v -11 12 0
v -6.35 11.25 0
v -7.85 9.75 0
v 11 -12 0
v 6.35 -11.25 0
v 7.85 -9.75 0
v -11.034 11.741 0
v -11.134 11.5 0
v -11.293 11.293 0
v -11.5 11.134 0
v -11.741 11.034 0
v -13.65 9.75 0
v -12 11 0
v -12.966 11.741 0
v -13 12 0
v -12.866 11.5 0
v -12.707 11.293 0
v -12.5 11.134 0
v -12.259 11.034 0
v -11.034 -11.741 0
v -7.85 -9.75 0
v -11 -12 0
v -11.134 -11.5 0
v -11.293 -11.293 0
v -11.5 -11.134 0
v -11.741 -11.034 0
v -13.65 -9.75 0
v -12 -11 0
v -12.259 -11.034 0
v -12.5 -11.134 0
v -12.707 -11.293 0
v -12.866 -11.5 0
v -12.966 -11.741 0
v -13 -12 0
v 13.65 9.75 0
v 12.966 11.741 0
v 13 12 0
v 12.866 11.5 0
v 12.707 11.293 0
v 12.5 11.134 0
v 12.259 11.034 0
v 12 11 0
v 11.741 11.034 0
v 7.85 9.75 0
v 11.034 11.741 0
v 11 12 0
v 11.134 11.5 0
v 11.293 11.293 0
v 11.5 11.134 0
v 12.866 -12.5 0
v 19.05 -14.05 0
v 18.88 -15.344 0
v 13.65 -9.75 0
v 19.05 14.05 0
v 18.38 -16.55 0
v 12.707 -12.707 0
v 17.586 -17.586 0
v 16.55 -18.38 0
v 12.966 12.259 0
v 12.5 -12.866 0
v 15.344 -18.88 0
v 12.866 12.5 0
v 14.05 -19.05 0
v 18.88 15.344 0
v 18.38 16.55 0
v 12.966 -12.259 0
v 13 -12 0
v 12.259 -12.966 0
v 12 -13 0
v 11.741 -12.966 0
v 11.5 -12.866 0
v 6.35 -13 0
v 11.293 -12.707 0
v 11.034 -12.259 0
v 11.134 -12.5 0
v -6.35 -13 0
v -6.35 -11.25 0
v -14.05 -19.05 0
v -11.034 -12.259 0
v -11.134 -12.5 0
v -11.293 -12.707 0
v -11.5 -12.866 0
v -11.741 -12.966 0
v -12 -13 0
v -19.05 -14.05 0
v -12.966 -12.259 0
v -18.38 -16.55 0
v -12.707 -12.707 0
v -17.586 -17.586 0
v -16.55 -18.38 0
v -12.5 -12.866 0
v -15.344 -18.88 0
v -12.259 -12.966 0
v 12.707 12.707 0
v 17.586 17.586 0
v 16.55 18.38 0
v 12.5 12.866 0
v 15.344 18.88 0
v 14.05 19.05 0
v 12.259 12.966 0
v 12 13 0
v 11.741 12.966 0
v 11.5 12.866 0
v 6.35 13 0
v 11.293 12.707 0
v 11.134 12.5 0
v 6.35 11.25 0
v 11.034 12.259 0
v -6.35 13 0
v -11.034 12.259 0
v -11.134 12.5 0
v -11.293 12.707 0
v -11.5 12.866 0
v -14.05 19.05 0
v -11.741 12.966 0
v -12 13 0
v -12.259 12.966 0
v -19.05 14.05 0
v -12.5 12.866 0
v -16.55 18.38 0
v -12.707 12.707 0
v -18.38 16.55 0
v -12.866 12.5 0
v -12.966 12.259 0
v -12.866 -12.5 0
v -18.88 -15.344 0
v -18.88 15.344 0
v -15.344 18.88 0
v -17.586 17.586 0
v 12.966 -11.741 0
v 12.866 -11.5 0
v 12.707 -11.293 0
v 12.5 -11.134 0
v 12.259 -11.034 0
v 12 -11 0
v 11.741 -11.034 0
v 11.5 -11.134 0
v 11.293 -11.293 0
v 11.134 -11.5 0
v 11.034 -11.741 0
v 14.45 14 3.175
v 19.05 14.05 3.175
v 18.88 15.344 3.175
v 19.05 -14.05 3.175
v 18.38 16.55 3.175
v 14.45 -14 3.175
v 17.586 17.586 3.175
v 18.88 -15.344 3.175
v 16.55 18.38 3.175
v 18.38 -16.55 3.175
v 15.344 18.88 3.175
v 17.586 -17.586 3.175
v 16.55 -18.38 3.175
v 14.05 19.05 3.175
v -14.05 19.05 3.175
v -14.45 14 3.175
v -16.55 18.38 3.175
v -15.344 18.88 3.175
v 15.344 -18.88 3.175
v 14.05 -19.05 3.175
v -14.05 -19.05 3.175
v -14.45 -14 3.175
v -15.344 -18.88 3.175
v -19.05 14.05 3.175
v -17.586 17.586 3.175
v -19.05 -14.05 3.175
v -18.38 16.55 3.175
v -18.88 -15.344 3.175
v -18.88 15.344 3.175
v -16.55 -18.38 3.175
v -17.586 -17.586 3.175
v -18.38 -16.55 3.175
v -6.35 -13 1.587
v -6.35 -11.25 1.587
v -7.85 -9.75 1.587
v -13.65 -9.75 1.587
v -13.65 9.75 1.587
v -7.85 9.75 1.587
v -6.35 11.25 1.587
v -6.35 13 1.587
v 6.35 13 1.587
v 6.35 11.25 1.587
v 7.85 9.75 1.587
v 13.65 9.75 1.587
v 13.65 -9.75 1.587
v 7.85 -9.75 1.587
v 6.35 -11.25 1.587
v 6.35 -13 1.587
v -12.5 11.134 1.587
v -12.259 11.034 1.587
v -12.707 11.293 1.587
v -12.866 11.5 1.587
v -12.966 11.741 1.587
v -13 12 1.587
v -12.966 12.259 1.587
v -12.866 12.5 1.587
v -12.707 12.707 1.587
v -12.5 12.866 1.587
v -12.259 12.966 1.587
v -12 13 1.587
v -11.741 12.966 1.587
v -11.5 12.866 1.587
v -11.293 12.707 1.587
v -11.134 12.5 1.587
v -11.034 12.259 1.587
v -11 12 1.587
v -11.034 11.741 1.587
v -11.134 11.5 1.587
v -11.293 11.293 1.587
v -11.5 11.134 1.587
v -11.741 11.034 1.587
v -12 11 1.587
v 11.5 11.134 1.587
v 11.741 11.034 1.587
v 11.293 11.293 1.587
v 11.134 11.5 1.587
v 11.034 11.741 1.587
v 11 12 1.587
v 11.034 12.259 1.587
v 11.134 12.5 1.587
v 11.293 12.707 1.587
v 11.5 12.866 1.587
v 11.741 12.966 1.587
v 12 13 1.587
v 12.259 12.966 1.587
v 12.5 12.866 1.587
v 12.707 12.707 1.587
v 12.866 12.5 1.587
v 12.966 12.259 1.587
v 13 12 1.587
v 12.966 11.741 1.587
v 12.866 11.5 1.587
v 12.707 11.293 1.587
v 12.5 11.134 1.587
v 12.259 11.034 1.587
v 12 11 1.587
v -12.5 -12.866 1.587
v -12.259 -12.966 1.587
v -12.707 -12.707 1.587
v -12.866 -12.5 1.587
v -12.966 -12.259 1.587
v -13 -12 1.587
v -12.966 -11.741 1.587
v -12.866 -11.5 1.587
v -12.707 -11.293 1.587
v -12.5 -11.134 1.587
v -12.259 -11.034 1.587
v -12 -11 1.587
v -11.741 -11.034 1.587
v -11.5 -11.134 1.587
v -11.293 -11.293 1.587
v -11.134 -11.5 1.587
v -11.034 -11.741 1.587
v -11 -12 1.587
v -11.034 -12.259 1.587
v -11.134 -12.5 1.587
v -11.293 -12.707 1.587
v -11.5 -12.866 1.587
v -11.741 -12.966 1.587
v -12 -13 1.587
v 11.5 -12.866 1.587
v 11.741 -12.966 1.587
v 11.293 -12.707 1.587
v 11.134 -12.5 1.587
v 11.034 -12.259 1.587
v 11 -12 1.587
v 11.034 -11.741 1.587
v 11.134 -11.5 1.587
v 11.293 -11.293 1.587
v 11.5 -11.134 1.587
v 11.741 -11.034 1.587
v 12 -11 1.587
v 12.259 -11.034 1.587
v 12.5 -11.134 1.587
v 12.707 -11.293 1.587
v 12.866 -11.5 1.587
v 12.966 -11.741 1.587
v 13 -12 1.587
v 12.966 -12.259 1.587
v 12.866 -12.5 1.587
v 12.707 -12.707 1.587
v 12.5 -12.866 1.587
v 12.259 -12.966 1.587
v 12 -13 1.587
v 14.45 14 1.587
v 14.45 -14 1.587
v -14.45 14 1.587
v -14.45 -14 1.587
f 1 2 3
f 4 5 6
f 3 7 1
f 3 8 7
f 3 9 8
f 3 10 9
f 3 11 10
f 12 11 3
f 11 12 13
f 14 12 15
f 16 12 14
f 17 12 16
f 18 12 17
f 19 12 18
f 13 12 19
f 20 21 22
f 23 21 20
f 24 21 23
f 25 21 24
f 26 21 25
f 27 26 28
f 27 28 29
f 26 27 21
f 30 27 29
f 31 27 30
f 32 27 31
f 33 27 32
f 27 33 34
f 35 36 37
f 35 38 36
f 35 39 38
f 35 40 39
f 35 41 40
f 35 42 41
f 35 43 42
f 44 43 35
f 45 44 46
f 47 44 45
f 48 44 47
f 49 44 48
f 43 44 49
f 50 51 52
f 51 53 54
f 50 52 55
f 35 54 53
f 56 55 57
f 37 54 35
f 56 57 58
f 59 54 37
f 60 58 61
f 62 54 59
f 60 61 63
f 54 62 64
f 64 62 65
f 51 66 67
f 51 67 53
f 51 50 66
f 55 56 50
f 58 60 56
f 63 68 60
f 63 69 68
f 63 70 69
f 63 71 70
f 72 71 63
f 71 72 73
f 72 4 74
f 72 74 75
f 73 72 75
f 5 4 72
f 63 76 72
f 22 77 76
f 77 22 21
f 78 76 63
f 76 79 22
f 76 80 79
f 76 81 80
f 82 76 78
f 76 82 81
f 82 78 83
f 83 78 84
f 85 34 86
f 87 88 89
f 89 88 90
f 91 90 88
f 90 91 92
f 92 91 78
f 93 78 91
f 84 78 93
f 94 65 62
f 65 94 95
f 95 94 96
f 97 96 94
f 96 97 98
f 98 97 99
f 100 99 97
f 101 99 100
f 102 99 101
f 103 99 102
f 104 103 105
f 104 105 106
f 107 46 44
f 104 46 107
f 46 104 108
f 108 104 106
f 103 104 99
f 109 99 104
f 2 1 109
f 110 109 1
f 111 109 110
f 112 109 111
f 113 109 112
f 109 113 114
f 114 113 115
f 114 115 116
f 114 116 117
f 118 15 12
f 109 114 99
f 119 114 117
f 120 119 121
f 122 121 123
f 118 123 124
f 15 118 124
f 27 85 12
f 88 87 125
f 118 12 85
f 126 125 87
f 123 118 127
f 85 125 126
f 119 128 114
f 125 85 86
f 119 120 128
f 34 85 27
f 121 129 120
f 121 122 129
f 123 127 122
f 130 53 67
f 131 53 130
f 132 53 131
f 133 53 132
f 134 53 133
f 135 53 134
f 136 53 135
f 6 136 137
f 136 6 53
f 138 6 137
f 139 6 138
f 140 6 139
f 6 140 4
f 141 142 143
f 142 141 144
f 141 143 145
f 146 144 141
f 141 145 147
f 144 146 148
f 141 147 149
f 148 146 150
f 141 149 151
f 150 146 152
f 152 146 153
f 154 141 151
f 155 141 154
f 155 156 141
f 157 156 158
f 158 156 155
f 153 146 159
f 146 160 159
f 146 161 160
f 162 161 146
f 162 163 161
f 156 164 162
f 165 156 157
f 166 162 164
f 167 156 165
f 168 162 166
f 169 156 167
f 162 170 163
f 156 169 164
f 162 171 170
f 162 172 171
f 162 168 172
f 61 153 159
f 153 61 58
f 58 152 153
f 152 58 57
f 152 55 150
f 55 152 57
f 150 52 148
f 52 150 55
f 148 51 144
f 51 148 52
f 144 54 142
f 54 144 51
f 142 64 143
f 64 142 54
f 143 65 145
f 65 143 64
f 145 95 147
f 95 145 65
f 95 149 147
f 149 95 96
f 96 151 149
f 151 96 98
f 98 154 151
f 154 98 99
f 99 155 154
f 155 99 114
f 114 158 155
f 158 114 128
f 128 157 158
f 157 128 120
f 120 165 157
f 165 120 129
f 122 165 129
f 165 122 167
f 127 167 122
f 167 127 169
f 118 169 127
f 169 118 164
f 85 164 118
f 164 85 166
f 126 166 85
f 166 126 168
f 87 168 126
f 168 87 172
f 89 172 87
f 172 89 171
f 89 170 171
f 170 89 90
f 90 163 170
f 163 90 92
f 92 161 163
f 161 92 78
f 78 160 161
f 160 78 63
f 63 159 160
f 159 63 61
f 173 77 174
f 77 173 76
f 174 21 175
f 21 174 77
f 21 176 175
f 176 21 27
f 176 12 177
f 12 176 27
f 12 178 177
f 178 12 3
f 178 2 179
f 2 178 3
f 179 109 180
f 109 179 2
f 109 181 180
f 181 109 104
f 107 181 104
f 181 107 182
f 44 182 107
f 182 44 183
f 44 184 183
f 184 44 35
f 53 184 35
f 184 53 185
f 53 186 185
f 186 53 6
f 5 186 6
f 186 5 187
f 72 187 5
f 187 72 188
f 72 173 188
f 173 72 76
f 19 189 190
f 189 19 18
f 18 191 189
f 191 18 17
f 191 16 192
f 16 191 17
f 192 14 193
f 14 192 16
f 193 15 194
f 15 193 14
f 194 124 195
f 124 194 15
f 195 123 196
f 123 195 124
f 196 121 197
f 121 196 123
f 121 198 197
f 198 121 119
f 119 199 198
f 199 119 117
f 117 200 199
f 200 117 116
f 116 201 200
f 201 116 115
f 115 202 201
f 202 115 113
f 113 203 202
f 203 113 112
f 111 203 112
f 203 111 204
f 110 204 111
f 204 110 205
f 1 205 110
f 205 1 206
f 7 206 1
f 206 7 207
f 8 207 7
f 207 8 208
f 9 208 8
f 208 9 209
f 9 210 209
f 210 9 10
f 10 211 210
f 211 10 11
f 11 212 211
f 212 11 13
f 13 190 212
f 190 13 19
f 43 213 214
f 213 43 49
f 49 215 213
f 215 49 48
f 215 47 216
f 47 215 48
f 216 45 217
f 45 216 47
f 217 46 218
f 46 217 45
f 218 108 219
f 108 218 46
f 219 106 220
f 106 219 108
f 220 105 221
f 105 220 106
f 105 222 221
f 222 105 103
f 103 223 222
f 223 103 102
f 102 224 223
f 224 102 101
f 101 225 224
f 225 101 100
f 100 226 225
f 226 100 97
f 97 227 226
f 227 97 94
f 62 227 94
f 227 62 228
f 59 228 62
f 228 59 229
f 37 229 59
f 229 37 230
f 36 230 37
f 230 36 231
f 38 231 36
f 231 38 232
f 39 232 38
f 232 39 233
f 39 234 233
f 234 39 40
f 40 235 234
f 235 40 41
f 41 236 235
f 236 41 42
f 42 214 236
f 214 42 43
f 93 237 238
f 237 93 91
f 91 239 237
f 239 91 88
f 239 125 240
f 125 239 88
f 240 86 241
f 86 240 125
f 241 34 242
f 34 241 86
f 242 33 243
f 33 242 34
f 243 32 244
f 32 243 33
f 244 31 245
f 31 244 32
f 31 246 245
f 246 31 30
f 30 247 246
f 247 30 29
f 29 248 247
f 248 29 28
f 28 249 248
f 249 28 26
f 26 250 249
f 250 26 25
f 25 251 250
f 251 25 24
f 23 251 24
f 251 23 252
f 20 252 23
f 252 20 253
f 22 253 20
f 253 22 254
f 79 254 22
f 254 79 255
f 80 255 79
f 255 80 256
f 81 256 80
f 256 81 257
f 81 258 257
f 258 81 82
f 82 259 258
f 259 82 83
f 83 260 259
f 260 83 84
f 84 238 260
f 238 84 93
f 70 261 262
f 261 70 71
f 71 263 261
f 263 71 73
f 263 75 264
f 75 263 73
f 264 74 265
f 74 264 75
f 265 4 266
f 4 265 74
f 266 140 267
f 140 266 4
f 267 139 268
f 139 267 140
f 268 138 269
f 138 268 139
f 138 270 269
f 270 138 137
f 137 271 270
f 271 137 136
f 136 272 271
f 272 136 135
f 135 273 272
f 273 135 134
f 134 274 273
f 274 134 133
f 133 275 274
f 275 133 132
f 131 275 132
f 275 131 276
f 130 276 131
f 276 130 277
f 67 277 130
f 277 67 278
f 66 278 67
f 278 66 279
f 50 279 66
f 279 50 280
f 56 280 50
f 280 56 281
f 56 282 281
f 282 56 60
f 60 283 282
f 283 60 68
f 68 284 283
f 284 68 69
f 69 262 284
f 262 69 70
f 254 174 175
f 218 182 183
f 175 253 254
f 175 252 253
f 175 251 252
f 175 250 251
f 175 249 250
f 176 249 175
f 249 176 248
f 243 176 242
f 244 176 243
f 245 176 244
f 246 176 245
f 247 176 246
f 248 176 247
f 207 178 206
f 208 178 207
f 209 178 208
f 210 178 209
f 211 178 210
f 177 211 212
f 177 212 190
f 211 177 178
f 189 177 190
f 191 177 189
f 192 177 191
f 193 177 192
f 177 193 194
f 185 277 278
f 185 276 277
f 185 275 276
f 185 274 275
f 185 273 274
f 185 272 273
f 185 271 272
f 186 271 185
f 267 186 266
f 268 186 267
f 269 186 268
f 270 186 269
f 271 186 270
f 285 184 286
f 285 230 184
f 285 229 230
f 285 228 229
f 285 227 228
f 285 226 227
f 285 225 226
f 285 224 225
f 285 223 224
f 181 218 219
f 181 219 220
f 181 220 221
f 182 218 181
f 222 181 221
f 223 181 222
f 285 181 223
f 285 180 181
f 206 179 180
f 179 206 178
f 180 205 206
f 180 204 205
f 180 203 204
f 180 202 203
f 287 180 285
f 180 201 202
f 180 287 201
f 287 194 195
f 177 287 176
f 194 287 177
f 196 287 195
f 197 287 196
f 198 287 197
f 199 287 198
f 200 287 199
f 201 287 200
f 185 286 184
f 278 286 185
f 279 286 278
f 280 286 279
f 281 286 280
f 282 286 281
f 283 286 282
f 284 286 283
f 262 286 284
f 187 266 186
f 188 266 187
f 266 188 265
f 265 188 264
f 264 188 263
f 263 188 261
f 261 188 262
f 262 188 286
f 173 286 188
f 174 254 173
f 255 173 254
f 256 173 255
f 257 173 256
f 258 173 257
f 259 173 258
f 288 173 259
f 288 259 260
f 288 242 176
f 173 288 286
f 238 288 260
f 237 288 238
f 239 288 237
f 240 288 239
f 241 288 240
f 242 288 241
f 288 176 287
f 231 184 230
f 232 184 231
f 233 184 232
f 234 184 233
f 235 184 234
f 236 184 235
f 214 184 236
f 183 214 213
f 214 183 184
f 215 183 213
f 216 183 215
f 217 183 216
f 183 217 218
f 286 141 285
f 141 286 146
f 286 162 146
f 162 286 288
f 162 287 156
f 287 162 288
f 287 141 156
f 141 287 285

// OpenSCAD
// file: ../lib/TOGUnitTable-v1.scad
// TOGUnitTable-v1.1.0 - Library for handling 'complex amounts' in the form of [multiplier, unit name], e.g. [1.5, "inch"]
//
// 2023-07-01: the following 'annotation' is something I just made up,
// but is intended as a way for future packaging tools to know that it's 'safe'
// (because everything has been somewhat namespaced) to turn a `use <x>`
// into an `include <x>`, making it inlinable:
// safe-to-include: true
// 
// Versions:
// v1.0.0:
// - Created it.
// v1.1.0:
// - Add optional 'dbgctxstr' parameter to unit decoding functions, for better error messages
// 
// Naming convention:
// Doing 'OO without classes', here.
// Fully qualified name = class or package name + "__" + member name
// Class or package name may itself be namespaced, and class names may double as package names.
// Here, tog_unittable names both a class and a package.

// Demo unit table uses 'micrometer' as the base unit
// in order to keep multipliers as integers as much as possible.
tog_unittable__demo_unit_table = [
	["um",    [    1   ,   "um"], "micrometer" ],
	["mm",    [ 1000   ,   "um"], "millimeter" ],
	["inch",  [25400   ,   "um"], "inch"       ],
	["u",     [    1/16, "inch"], "model unit" ], // As used by TGx9 et al
	["atom",  [    8   ,    "u"], "model atom" ],
	["chunk", [    3   , "atom"], "model chunk"],
];

use <./DbgCtxStrLib1.scad>

function tog_unittable__list__filter(list, predicate) = [
	for( item=list ) if( predicate(item) ) item
];
function tog_unittable__list__first(list, on_error) =
	len(list) > 0 ? list[0] : on_error();

function tog_unittable__unit_value_ca(unit_table, unit_name, dbgctxstr=undef) =
	tog_unittable__list__first(
		tog_unittable__list__filter(unit_table, function (entry) entry[0] == unit_name),
		function () assert(false,
			str("Did not find entry for unit '", unit_name, "' in unit table", dbgctxstr_errmsg_suffix(dbgctxstr))
		)
	)[1];

function tog_unittable__ca__is_valid( ca ) =
	is_list(ca) && len(ca) == 2;

// Break down 'amount' until it is in a base unit (one which is defined in terms of itself)
function tog_unittable__simplify_ca(unit_table, amount, dbgctxstr=undef) =
	assert( tog_unittable__ca__is_valid(amount), str(amount, " is not a valid Complex Amount (should be [numeric_value, \"unit_name\"])", dbgctxstr=dbgctxstr) )
	let( unit_value_ca = tog_unittable__unit_value_ca(unit_table, amount[1], dbgctxstr=dbgctxstr) )
	unit_value_ca[1] == amount[1] ? amount :
		tog_unittable__simplify_ca(unit_table, [amount[0] * unit_value_ca[0], unit_value_ca[1]]);

function tog_unittable__divide_ca(unit_table, numerator, denominator, dbgctxstr=undef) =
	let(
		numerator_base_ca   = tog_unittable__simplify_ca(unit_table, numerator, dbgctxstr=dbgctxstr),
		denominator_base_ca = tog_unittable__simplify_ca(unit_table, denominator, dbgctxstr=dbgctxstr)
	)
	assert(numerator_base_ca[1] == denominator_base_ca[1], str("Different base units found for ", numerator[1], " and ", denominator[1]))
	numerator_base_ca[0] / denominator_base_ca[0];	

assert(tog_unittable__divide_ca(tog_unittable__demo_unit_table, [1,   "mm"], [  1, "mm"]) ==     1   );
assert(tog_unittable__divide_ca(tog_unittable__demo_unit_table, [1,   "mm"], [  1, "um"]) ==  1000   );
assert(tog_unittable__divide_ca(tog_unittable__demo_unit_table, [1, "inch"], [  1, "um"]) == 25400   );
assert(tog_unittable__divide_ca(tog_unittable__demo_unit_table, [1, "inch"], [  1, "mm"]) ==    25.4 );
assert(tog_unittable__divide_ca(tog_unittable__demo_unit_table, [1, "inch"], [254, "um"]) ==   100   );
assert(tog_unittable__divide_ca(tog_unittable__demo_unit_table, [1,    "u"], [  1, "um"]) ==  1587.5 );
// file: ../lib/TOGStringLib1.scad
// TOGStringLib1.7
// 
// Functions for parsing quantities
// and other misc. string handling.
// 
// v1.5
// - togstr1_parse_quantity will treat unit-only strings as meaning 1/1 of that unit.
//   e.g. togstr1_parse_quantity("foot") = [[[1,1], "foot", 4]]
// v1.6:
// - togstr1_parse_quantity allows unit name to be omitted when quantity is zero and $togunits1_default_unit is defined
// v1.7:
// - Add optional 'dbgctxstr' parameter to unit decoding functions, for better error messages
// 
// Globals: $togunits1_default_unit - affects what 'unit' is returned
// when interpreting numbers or strings that lack the unit.


function togstr1__todo(message) = assert(false, str("TODO: ", message));

module togstr1__assert_eq(a, b) {
	if( a != b ) {
		assert( a == b, str(a, " != ", b) );
	}
}



function togstr1_slice(source, i0, i1) =
	i0 == i1 ? "" :
	str(source[i0], togstr1_slice(source, i0+1, i1));

function togstr1_tokenize(source, sep, maxcount=9999, i=0, tokenstart=0) =
	len(source) == i ? (
		(tokenstart < i) ? [togstr1_slice(source, tokenstart, i)] : []
	) :
	source[i] == sep ? (
		(tokenstart < i) ? concat([togstr1_slice(source, tokenstart, i)], togstr1_tokenize(source, sep, maxcount-1, i+1, i+1)) :
		togstr1_tokenize(source, sep, maxcount, i+1, i+1)
	) :
	maxcount <= 1 ? [togstr1_slice(source, tokenstart, len(source))] :
	togstr1_tokenize(source, sep, maxcount, i+1, tokenstart);

togstr1__assert_eq( ["foo","bar","baz"], togstr1_tokenize("foo-bar-baz", "-") );
// Duplicate delimiters are ignored
togstr1__assert_eq( ["foo","bar","baz"], togstr1_tokenize("foo--bar--baz", "-") );
// Trailing delimiters are ignored
togstr1__assert_eq( ["foo","bar","baz"], togstr1_tokenize("foo--bar--baz--", "-") );
// Leading delimiters are ignored
togstr1__assert_eq( ["foo","bar","baz"], togstr1_tokenize("--foo--bar--baz", "-") );
// Can limit number of tokens returned
togstr1__assert_eq( ["foo","bar-baz"], togstr1_tokenize("foo-bar-baz", "-", 2) );
togstr1__assert_eq( ["foo","bar-baz"], togstr1_tokenize("--foo--bar-baz", "-", 2) );
togstr1__assert_eq( ["foo","bar--baz"], togstr1_tokenize("--foo--bar--baz", "-", 2) );
togstr1__assert_eq( ["foo"], togstr1_tokenize("--foo--", "-", 2) );




/** \d+ -> [num, end_index] */
function togstr1_parse_decimal_nat(str, index=0, current=0, dbgctxstr=undef) =
	len(str) == index ? [current, index] :
	let( dig = ord(str[index]) - ord("0") )
	(dig >= 0 && dig <= 9) ? togstr1_parse_decimal_nat(str, index+1, current*10 + dig, dbgctxstr=dbgctxstr) :
	[current, index];

togstr1__assert_eq( [123,3], togstr1_parse_decimal_nat("123") );
togstr1__assert_eq( [123,3], togstr1_parse_decimal_nat("123.45") );

/** [+-]*\d+ ->  [[num, den], end_index] */
function togstr1_parse_decimal_number(str, index=0, dbgctxstr=undef) =
	str[index] == "+" ? togstr1_parse_decimal_number(str, index+1) :
	str[index] == "-" ? let(r=togstr1_parse_decimal_number(str, index+1)) [[-r[0][0], r[0][1]], r[1]] :
	let(r = togstr1_parse_decimal_nat(str, index, dbgctxstr=dbgctxstr))
	str[r[1]] != "." ? [[r[0], 1], r[1]] :
	let(fracr = togstr1_parse_decimal_nat(str, r[1]+1))
	let(mult = pow(10, fracr[1]-(r[1]+1)))
	[[r[0]*mult + fracr[0], mult], fracr[1]];

togstr1__assert_eq( [[   36,   1], 2], togstr1_parse_decimal_number( "36"   ) );
togstr1__assert_eq( [[ 3524, 100], 5], togstr1_parse_decimal_number( "35.24") );
togstr1__assert_eq( [[-3524, 100], 6], togstr1_parse_decimal_number("-35.24") );
togstr1__assert_eq( [[    0,   1], 0], togstr1_parse_decimal_number( "NotANumber") );

function togstr1__gcd(a, b) = b == 0 ? abs(a) : togstr1__gcd(b, a % b);

togstr1__assert_eq(10, togstr1__gcd(10, 20));
togstr1__assert_eq( 5, togstr1__gcd(10, 15));
togstr1__assert_eq( 2, togstr1__gcd(10, 14));


function togstr1__normalize_rat(rat) =
	let(gcd = togstr1__gcd(rat[0], rat[1]))
	// TODO: find LCD, divide top and bottom by it
	rat[0] < 0 && rat[1] < 0 ? [-rat[0]/gcd, -rat[1]/gcd] :
	[rat[0]/gcd, rat[1]/gcd];

/** <decnum>[/<decnum>] -> [[num, den], end_index] */
function togstr1__multiply_rat(a, b) =
	togstr1__normalize_rat(
		a[1] == b[1] ? [a[0]*b[0]/a[1], a[1]] : // TODO: LCD instead of special case
		[a[0]*b[0], a[1]*b[1]]
	);
function togstr1__divide_rat(a, b) = togstr1__normalize_rat([a[0]*b[1], a[1]*b[0]]);


function togstr1__add_rat(a, b) =
	togstr1__normalize_rat([a[0]*b[1] + b[0]*a[1], a[1]*b[1]]);
	
togstr1__assert_eq([1, 2], togstr1__add_rat([1, 3], [1, 6]));


/** Return [[num, den], end_index] */
function togstr1_parse_rational_number(str, index=0, dbgctxstr=undef) =
	let( numr = togstr1_parse_decimal_number(str, index, dbgctxstr=dbgctxstr) )
	str[numr[1]] == "+" ?
		let(numrb = togstr1_parse_rational_number(str, numr[1]+1, dbgctxstr=dbgctxstr))
		[togstr1__add_rat(numr[0], numrb[0]), numrb[1]]	:
	str[numr[1]] == "/" ?
		let( denr = togstr1_parse_decimal_number(str, numr[1]+1, dbgctxstr=dbgctxstr) )
		[togstr1__divide_rat(numr[0], denr[0]), denr[1]] :
	numr;

togstr1__assert_eq( [[   123,  1],3], togstr1_parse_rational_number( "123") );
togstr1__assert_eq( [[   123,  1],4], togstr1_parse_rational_number("+123") );
togstr1__assert_eq( [[-  123,  1],4], togstr1_parse_rational_number("-123") );
togstr1__assert_eq( [[   123,  1],6], togstr1_parse_rational_number("-+-123") );
togstr1__assert_eq( [[ 12345,100],6], togstr1_parse_rational_number("123.45") );
togstr1__assert_eq( [[  2469, 40],8], togstr1_parse_rational_number("123.45/2") );
togstr1__assert_eq( [[-  823,160],10], togstr1_parse_rational_number("-123.45/24") );
togstr1__assert_eq( [[     4,  3],5], togstr1_parse_rational_number( "1+1/3") );
togstr1__assert_eq( [[     0,  1],0], togstr1_parse_rational_number( "NotANumber!!") );


/** Return [[[num, den], unit], end_index] */
function togstr1_parse_quantity(str, dbgctxstr=undef) =
	let( numr = togstr1_parse_rational_number(str, dbgctxstr=dbgctxstr) )
	// For now, just let the unit be the rest of the string;
	// can revisit to stop at delimiters if needed in the future.
	numr[1] > 0 && numr[1] == len(str) && numr[0][0] == 0 && !is_undef($togunits1_default_unit) ? [[[0,1], $togunits1_default_unit], numr[1]] :
	assert( numr[1] < len(str), str("Quantity string missing unit: '", str, "'; note that '0' is acceptable if $togunits1_default_unit is defined"))
	let( unit = togstr1_slice(str, numr[1], len(str)) )
	let( quant = numr[1] > 0 ? numr[0] : [1,1] ) // No number = 1 (possibly this should be an error instead)
	[[quant, unit], len(str)];

togstr1__assert_eq( [[[  3,  1], "acre"],  5], togstr1_parse_quantity("3acre") );
togstr1__assert_eq( [[[  3,  5], "acre"],  7], togstr1_parse_quantity("3/5acre") );
togstr1__assert_eq( [[[301,500], "acre"], 10], togstr1_parse_quantity("3.01/5acre") );
togstr1__assert_eq( [[[  1,  1], "acre"],  4], togstr1_parse_quantity("acre") ); // Should either treat as one or throw an error!
togstr1__assert_eq( [[[  0,  1],"hectare"],1], togstr1_parse_quantity("0", $togunits1_default_unit="hectare") ); // Zero is fine if $togunits1_default_unit is defined
// file: ../lib/TOGridLib3.scad
// TOGridPileLib-v3.4
// 
// HOKAY WHAT ARE THE COMMON
// things that I want the library to do?
// 
// - [X] Be `include`-able, to make inlining easy
// - [X] Allow unit table to be overridden easily, but default by default
// - [ ] Support common configurations by name (e.g. "V9", or some "WSTYPE-...")
//   without having to pass 50 different parameters in
// - [ ] Support subtractions for those common configurations also,
//   such that you don't need to remember to 'do less rounding', etc.
// - [ ] Make a simple foot-only block that I can subtract stuff from
//   params: foot style
// - [ ] Make a block with a lip
// - [ ] Make a block foot, and I'll intersect it with some other things
// - [X] Translate a block_size_ca to mm
// 
// Changes:
// v3.1:
// - s/togridpile3_decode_size/togridpile3_decode_vector/
// v3.2:
// - togridpile3_decode(num) = num
// v3.3:
// - Change prefix from `togridpile3` to `togridlib3`
// v3.4:
// - Add optional 'dbgctxstr' parameter to unit decoding functions, for better error messages

use <../lib/TOGUnitTable-v1.scad>

function togridlib3_map(arr, fn) = [ for(item=arr) fn(item) ];

togridlib3_default_unit_table = [
	["um",    [    1,               "um"]],
	["mm",    [ 1000,               "um"]],
	["inch",  [25400,               "um"]],
	["u",     [    1.5875,          "mm"]],
	["atom",  [    8,                "u"]],
	["chunk", [    3,             "atom"]],
	["tgp-standard-bevel"   , [2,    "u"]], // Usuually 1/8"
	["m-outer-corner-radius", [4,    "u"]],
	["f-outer-corner-radius", [3,    "u"]],
];

function togridlib3_get_default_unit_table() = togridlib3_default_unit_table;
function togridlib3_get_unit_table() = is_undef($togridlib3_unit_table) ? togridlib3_default_unit_table : $togridlib3_unit_table;

function togridlib3_decode(dim, unit=[1, "mm"], unit_table=togridlib3_get_unit_table(), dbgctxstr=undef) =
	is_num(dim) ? dim : tog_unittable__divide_ca(unit_table, dim, unit, dbgctxstr=dbgctxstr);
function togridlib3_decode_vector(size, unit=[1, "mm"], unit_table=togridlib3_get_unit_table(), dbgctxstr=undef) =
	togridlib3_map(size, function(dim) is_num(dim) ? dim : tog_unittable__divide_ca(unit_table, dim, unit, dbgctxstr=dbgctxstr));

module togridlib3_cube(size, offset=0) {
	cube(togridlib3_decode_vector(size), center=true);
}
// file: ../lib/DbgCtxStrLib1.scad
// DbgCtxStrLib1.0
// 
// Library for dealing with 'debug context strings' (usually 'dbgctxstr').

function dbgctxstr_errmsg_suffix(dbgctxstr) =
	is_undef(dbgctxstr) || dbgctxstr == "" ? "" :
	str(" (", dbgctxstr, ")");
// file: ../lib/TOGArrayLib1.scad
// TOGArrayLib1.5
// 
// Functions for working with arrays.
// 
// v1.1:
// - tal1_reduce assert(is_list(items)) to prevent infinite recursion
//   when given undefined or other non-list values
// v1.1.1:
// - Fix tal1_uniq_remap_v2 to return "list-remap-result" as the
//   first element of the returned list
// v1.2:
// - Add tal1_replace_at function
// v1.3:
// - tal1_is_vec_of, tal1_is_vec_of_num
// v1.4:
// - tal1_assert_for_each, for when you want to assert something
//   about each of a list of items and get nice failure messages
// v1.5:
// - Add tal1_duplicate_reversed function, which may be
//   handy when generating symmetrical polygons and stuff.

/**
 * Make a list with the contents of list `a`,
 * but starting at offset `off`, replaced by the contents of list `b`.
 * len(result) = max(len(a), off+len(b))
 */
function tal1_replace_at(a, off, b, default_value=undef, default_value_function=undef) =
	assert(is_list(a))
	assert(is_list(b))
	let( _dvf = !is_undef(default_value_function) ? default_value_function : function(i) default_value )
[
	for( i=[0:1:min(off,len(a))-1] ) a[i],
	for( i=[len(a):1:off-1] ) _dvf(i),
	for( i=[off:1:off+len(b)-1] ) b[i-off],
	for( i=[off+len(b):1:len(a)-1] ) a[i],
];

// Simplest case
assert([] == tal1_replace_at([], 0, []));
// Second simplest cases
assert(["foo"] == tal1_replace_at(["foo"], 0, []));
assert(["foo"] == tal1_replace_at([], 0, ["foo"]));
// Replace one item
assert(["foo","quux","baz"] == tal1_replace_at(["foo","bar","baz"], 1, ["quux"]));
// Replace and extend
assert(["foo","quux","tuna","tina"] == tal1_replace_at(["foo","bar","baz"], 1, ["quux", "tuna", "tina"]));
// Add beyond end of `a`
assert(["foo","zzz","quux"] == tal1_replace_at(["foo"], 2, ["quux"], default_value="zzz"));
// Adding 'nothing' should still fill to that point with defaults
assert(["foo","zzz","zzz"] == tal1_replace_at(["foo"], 3, [], default_value="zzz"));


function tal1_reduce(start, items, func, offset=0) =
	assert(is_list(items))
	len(items) == offset ? start :
	tal1_reduce(func(start, items[offset]), items, func, offset+1);

function tal1_consecutive_duplicate_count(items) = tal1_reduce(
	[0, undef],
	items,
	function(z,item) [z[0] + (item == z[1] ? 1 : 0), item]
)[0];

assert(0 == tal1_consecutive_duplicate_count([]));
assert(0 == tal1_consecutive_duplicate_count([50]));
assert(1 == tal1_consecutive_duplicate_count([50,50]));
assert(0 == tal1_consecutive_duplicate_count([50,51,52,53]));
assert(1 == tal1_consecutive_duplicate_count([50,51,52,52]));
assert(3 == tal1_consecutive_duplicate_count([50,50,50,50]));

// Set test_size to arbirarily large values
// to ensure that OpenSCAD can handle heavy recursion
let(test_size=1000) assert(test_size/2 == tal1_consecutive_duplicate_count([for(i=[0:1:test_size-1]) floor(i/2)]));



function tal1_uniq_(items, off0, off1) =
	let(chunklen = off1-off0)
	chunklen == 0 ? [] :
	chunklen == 1 ? [items[off0]] :
	let(half=floor(chunklen/2))
	let(left  = tal1_uniq_(items, off0     , off0+half))
	let(right = tal1_uniq_(items, off0+half, off1     ))
	assert(len(left) > 0)
	assert(len(right) > 0)
	left[len(left)-1] == right[0] ? [each left, for(i=[1:1:len(right)-1]) right[i]] :
	[each left, each right];

/** Given a list of items, returns a new list with identical consecutive items merged */
function tal1_uniq(items) = tal1_uniq_(items, 0, len(items));

assert([] == tal1_uniq([]));
assert([123] == tal1_uniq([123]));
assert([55,0,1,2,3] == tal1_uniq([55,0,1,2,3]));
assert([55,0,1,2] == tal1_uniq([55,0,1,1,2]));
assert([55,0,1] == tal1_uniq([55,55,0,0,0,0,0,0,1,1,1,1]));
assert([55,0] == tal1_uniq([55,0,0,0,0,0,0,0]));



/**
 * Returns [new items, old index -> new index mapping].
 * No-op version.
 */
function tal1_uniq_remap_v1(items) =
	["list-remap-result", items, [for (vi=[0:1:len(items)-1]) vi]];

// [a, a, b, b, c, c]
//
// [a,    ...], []  -> [a],[0]
// [a, a, ...], [0] -> [a],[0,0]

assert([1,2,3] == [1,2,3]);

/**
 * Recursive version that will combine adjacent identical vertexes,
 * but will use the original items.
 */
function tal1_uniq_remap_v2(items, map=[]) =
	let(index = len(map))
	len(items) == index ? ["list-remap-result", items, map] :
	index == 0 ? tal1_uniq_remap_v2(items, [0]) :
	items[index] == items[map[index-1]] ? tal1_uniq_remap_v2(items, [for(vi=map) vi, map[index-1]]) :
	tal1_uniq_remap_v2(items, [for(vi=map) vi, index]);

assert(tal1_uniq_remap_v2([1,1,2,2,3,4]) == ["list-remap-result", [1,1,2,2,3,4], [0,0,2,2,4,5]]);


/**
 * Returns true if `vec` is a list of at least min_len items
 * and component_check(each item, even those beyond min_len) is true.
 */
function tal1_is_vec_of(vec, min_len=0, component_check=function(x) true) =
	assert(is_num(min_len) && min_len >= 0)
	assert(is_function(component_check))
	is_list(vec) && len(vec) >= min_len &&
	tal1_reduce(true, vec, function(prev,item) prev && component_check(item));

function tal1_is_vec_of_num(vec, min_len=0) = tal1_is_vec_of(vec, min_len, function(i) is_num(i));

assert( true == tal1_is_vec_of_num([1,2,3]));
assert( true == tal1_is_vec_of_num([]));
assert( true == tal1_is_vec_of_num([1,2,3], 3));
assert(false == tal1_is_vec_of_num([1,2], 3));
assert(false == tal1_is_vec_of_num([1,2,"spoon"], 3));
// Requirements are ambiguous when
// first min_len items are numbers, but there are non-numeric items afterwards,
// so let's error on the side of saying 'no, it's not a list of numbers';
// i.e. the item check and the min_len are independent.
assert(false == tal1_is_vec_of_num([1,2,3,"artichoke"], 3));


/**
 * Asserts that item_checker(each item in list, index of item)[0] is true.
 * Second element of item_checker return value is assertion message.
 * Returns the original list, in case that's useful to you.
 */
function tal1_assert_for_each(list, item_checker) =
	let( _ignored = [ for(i=[0:1:len(list)-1])
		let(q=item_checker(list[i],i))
		let(passed=is_bool(q) ? q : is_list(q) ? q[0] : assert(false, str(
			"tal1_assert_for_each: item_checker should return Bool|[Bool,String], but returned ",
			q, " for item at index ", i)))
		let(message=is_list(q) ? q[1] : undef)
		assert(passed, message)
		q
	])
	list;

// Callback can return a boolean...
assert([1,2,3] == tal1_assert_for_each([1,2,3], function(v,i) is_num(v)));
// ...or a [boolean, string]
assert([1,2,3] == tal1_assert_for_each([1,2,3], function(v,i) [is_num(v), "element be a num"]));

// [a, b, c] -> [a, b, c, rxf(c), rxf(b), rxf(a)]
function tal1_duplicate_reversed(list, rxf=function(item) item) =
	[
		each list,
		for( i=[len(list)-1 : -1 : 0] ) rxf(list[i]),
	];
// file: ../lib/TOGUnits1.scad
// TOGUnits1.7
// 
// For simlifying quantity parsing and unit conversion
// 
// v1.1:
// - Add `togunits1_decode` function
// v1.2:
// - Add togunits1_decode_vec
// v1.3:
// - Add togunits1_vec_to_cas
// v1.4:
// - Add togunits1_vec_to_mms
// v1.5:
// - Remove unused `unit` parameter from `togunits1_vec_to_cas`
// v1.6:
// - togunits1_decode accepts `xf` parameter, same as togunits1_decode_vec
// v1.7:
// - Add optional 'dbgctxstr' parameter to unit decoding functions, for better error messages
// 
// Reserved but not-yet-actually-used globals:
// - $togunits1_default_unit - default unit when interpreting "0"
//   - See TOGStringLib1
// - $togunits1_default_implied_unit - when interpreting quantities without unit, assume they have this one
//   - This might be a bad idea, so never implemented!

use <./DbgCtxStrLib1.scad>
use <./TOGridLib3.scad>
use <./TOGStringLib1.scad>

function togunits1__is_ca(what) =
	is_list(what) && len(what) == 2 && is_num(what[0]) && is_string(what[1]);

function togunits1__parse_to_ca(what, dbgctxstr=undef) =
	assert( is_string(what) )
	let( parseresult = togstr1_parse_quantity(what, dbgctxstr) )
	assert( parseresult[1] > 0, str("Failed to parse quantity from  ", what, dbgctxstr=dbgctxstr) )
	let( parsed = parseresult[0] )
	let( rat = parsed[0] )
	let( unit = parsed[1] )
	[rat[0]/rat[1], unit];

function togunits1_to_ca(what, dbgctxstr=undef) =
	is_string(what) ? togunits1__parse_to_ca(what, dbgctxstr=dbgctxstr) :
	togunits1__is_ca(what) ? what :
	is_num(what) ? [what, "mm"] :
	assert(false, str("Unrecognized quantity representation: ", what));

function togunits1_vec_to_cas(whats) =
	[for(w=whats) togunits1_to_ca(w)];

function togunits1__get_transform(name) =
	is_function(name) ? name :
	is_undef(name) ? function(n) n :
	name == "round" ? function(n) round(n) :
	name == "ceil" ? function(n) ceil(n) :
	assert(false, str("Unrecognized transform: '", name, "'"));

function togunits1_decode(what, unit=[1,"mm"], xf=undef, dbgctxstr=undef) =
	let( ca = togunits1_to_ca(what, dbgctxstr=dbgctxstr) )
	let( xf1 = togunits1__get_transform(xf) )
	xf1(togridlib3_decode(ca, unit=togunits1_to_ca(unit), dbgctxstr=dbgctxstr));

function togunits1_decode_vec(whats, unit=[1,"mm"], xf=undef) =
	let( unit_ca = togunits1_to_ca(unit) )
	let( xf1 = togunits1__get_transform(xf) )
	[for(w=whats) xf1(togunits1_decode(w, unit_ca))];

function togunits1_to_mm(what, dbgctxstr=undef) = togunits1_decode(what, [1,"mm"], dbgctxstr=dbgctxstr);
function togunits1_vec_to_mms(what) = togunits1_decode_vec(what, [1,"mm"]);
// file: ../lib/TOGMod1Constructors.scad
// TOGMod1Constructors-v1.11
// 
// Functions to construct objects understood by TOGMod1
// 
// v1.1:
// - Add togmod1_make_rounded_rect
// v1.2:
// - togmod1_make_rounded_rect can make ovals
// v1.3:
// - togmod1_circle_points, to just get the points of a circle
// - if pos parameter to circle function has a third element,
//   returned vertexes will include it as the z component;
// v1.3.1
// - Some assertions
// v1.4:
// - Refactor togmod1_rounded_rect_points and togmod1_circle_points
//   to use togmod1__make_nd_vector_adder for adapting to whatever
//   `pos` parameter is.
// v1.5:
// - togmod_rounded_rect_points will not simplify completely rounded sides
//   (where length of side is exactly twice the rounding radius)
//   unless simplify_rounded_sides=true
//   - This makes it more useful for polyhedron generation,
//     where radius varies, but number of points must remain constant.
// v1.6:
// - togmod1_make_rect makes a simple rectangle
// - togmod1_make_rounded_rect will defer to togmod1_make_rect when r=0
// v1.7:
// - togmod1_make_circle will return empty shape (["union"]) when d=0
// v1.8:
// - Add togmod1_text
// v1.9:
// - togmod1_circle_points uses 3 as minimum circle point count instead of 6
// v1.10:
// - Fix togmod1_linear_extrude_y so that range corresponds to Y start/end and
//   polygon X,Y correspond to X,Z.  Previously it was rotated wrongly,
//   which would have gone unnoticed for symmetrical shapes centered at 0,0.
// v1.11:
// - Remove an 'echo'

use <./TOGArrayLib1.scad>

function togmod1__make_nd_vector_adder(origin=[0,0]) =
	let(origin_is_zero = tal1_reduce(true, origin, function(prev,item) prev && item == 0))
	origin_is_zero ? (function(vec) len(vec) >= len(origin) ? vec : tal1_replace_at(origin, 0, vec)) :
	function(vec) [
		for(i=[0:1:max(len(origin),len(vec))-1]) (len(vec) > i ? vec[i] : 0) + (len(origin) > i ? origin[i] : 0),
	];

assert([1,2,3] == togmod1__make_nd_vector_adder()([1,2,3]));
assert([1,2,3] == togmod1__make_nd_vector_adder([0,0,3])([1,2]));


function togmod1_make_cuboid(size) =
	assert(is_list(size))
	assert(len(size) >= 3)
	assert(is_num(size[0]))
	assert(is_num(size[1]))
	assert(is_num(size[2]))
	["polyhedron-vf", [
		[-size[0]/2, -size[1]/2, -size[2]/2],
		[+size[0]/2, -size[1]/2, -size[2]/2],
		[-size[0]/2, +size[1]/2, -size[2]/2],
		[+size[0]/2, +size[1]/2, -size[2]/2],
		[-size[0]/2, -size[1]/2, +size[2]/2],
		[+size[0]/2, -size[1]/2, +size[2]/2],
		[-size[0]/2, +size[1]/2, +size[2]/2],
		[+size[0]/2, +size[1]/2, +size[2]/2]
	], [
		[0,1,3,2],[0,4,5,1],[4,6,7,5],[3,7,6,2],[1,5,7,3],[6,4,0,2]
	]];

function togmod1_make_polygon(verts) =
	["polygon-vp", verts, [[for( i=[0:1:len(verts)-1] ) i%len(verts)]]];

function togmod1_rounded_rect_points(size, r, pos=[0,0], simplify_rounded_sides=false) =
	assert(is_list(size))
	assert(len(size) >= 2)
	let(radii = is_list(r) ? r : is_num(r) ? [r,r] : assert(false, "rounded_rect r(adius) should be list<num> or num"))
	let(rx = radii[0])
	let(ry = radii[1])
	assert(is_num(rx))
	assert(is_num(ry))
	assert(size[0] >= 2*rx, str("size[0] must be >= 2*r[0]; size[0] = ",size[0],", 2*r[0] = ",2*rx))
	assert(size[1] >= 2*ry, str("size[1] must be >= 2*r[1]; size[1] = ",size[1],", 2*r[1] = ",2*ry))
	let(quarterfn=max($fn/4, 1))
	let(qfnx = simplify_rounded_sides && size[0] == 2*rx ? quarterfn-1 : quarterfn)
	let(qfny = simplify_rounded_sides && size[1] == 2*ry ? quarterfn-1 : quarterfn)
	let(finalizepos = togmod1__make_nd_vector_adder(pos))
[
	for(a=[0 : 1 : qfnx]) let(ang=      a*90/quarterfn) finalizepos([ size[0]/2-rx + rx*cos(ang),  size[1]/2-ry + ry*sin(ang)]),
	for(a=[0 : 1 : qfny]) let(ang= 90 + a*90/quarterfn) finalizepos([-size[0]/2+rx + rx*cos(ang),  size[1]/2-ry + ry*sin(ang)]),
	for(a=[0 : 1 : qfnx]) let(ang=180 + a*90/quarterfn) finalizepos([-size[0]/2+rx + rx*cos(ang), -size[1]/2+ry + ry*sin(ang)]),
	for(a=[0 : 1 : qfny]) let(ang=270 + a*90/quarterfn) finalizepos([ size[0]/2-rx + rx*cos(ang), -size[1]/2+ry + ry*sin(ang)]),
];

function togmod1_make_rect(size) =
	togmod1_make_polygon([
		[-size[0]/2, -size[1]/2],
		[+size[0]/2, -size[1]/2],
		[+size[0]/2, +size[1]/2],
		[-size[0]/2, +size[1]/2],
	]);

function togmod1_make_rounded_rect(size, r) =
	r == 0 ? togmod1_make_rect(size) :
	togmod1_make_polygon(togmod1_rounded_rect_points(size,r,simplify_rounded_sides=true));

/**
 * Returns points for an approximation of a circle where points are at distance r from pos.
 * Can be used to make other regular polygons, but the faces will be less than that
 * distance from pos (do some trig if you want face distance, e.g. for a hex nut).
 */
function togmod1_circle_points(r, pos=[0,0], d=undef) =
	assert( !is_undef(r) || !is_undef(d) )
	assert(!is_undef(pos[0]))
	assert(!is_undef(pos[1]))
	let(finalizepos = togmod1__make_nd_vector_adder(pos))
	let(r_ = !is_undef(r) ? r : d/2)
	let(fn = max($fn, 3))
	[for(i=[0 : 1 : fn-1]) finalizepos([r_*cos(i*360/fn), r_*sin(i*360/fn)])];

function togmod1_make_circle(r, pos=[0,0], d=undef) =
	r == 0 || d == 0 ? ["union"] :
	togmod1_make_polygon(togmod1_circle_points(r=r, pos=pos, d=d));

function togmod1_make_cylinder(d, zrange=[0,1], r=undef, pos=[0,0]) =
	assert( !is_undef(r) || !is_undef(d) )
	let( r_ = !is_undef(r) ? r : d/2 )
	// TODO: Make polyhedron directly
	["linear-extrude-zs", zrange, togmod1_make_circle(r=r_, pos=pos)];

function togmod1__is_range1d(range) = is_list(range) && len(range) == 2 && is_num(range[0]) && is_num(range[1]);

function togmod1_linear_extrude_z(range, shape) =
	assert(togmod1__is_range1d(range))
	["linear-extrude-zs", range, shape];
function togmod1_linear_extrude_x(range, shape) =
	assert(togmod1__is_range1d(range))
	["rotate", [90, 0, 90], togmod1_linear_extrude_z(range, shape)];
function togmod1_linear_extrude_y(range, shape) =
	assert(togmod1__is_range1d(range))
	["rotate", [90, 0,  0], togmod1_linear_extrude_z([-range[1], -range[0]], shape)];

function togmod1_text(text, size, font, halign, valign, spacing, direction, language, script) =
	["text-tsfhvsdls", text, size, font, halign, valign, spacing, direction, language, script];
// file: ../lib/TOGMod1.scad
// TOGMod1.9
// OpenSCAD library for representing shapes
// 
// See also: Functional OpenSCAD (https://github.com/thehans/FunctionalOpenSCAD)
// 
// v1.8:
// - Add `text-tsfhvsdls`
// v1.9
// - Add `offset-ds` (offset with _d_elta a _s_hape)

module togmod1_domodule(mod) {
	assert(is_list(mod));
	assert(len(mod) > 0);
	if( mod[0] == "polygon-vp" ) {
		// ["polygon-vp", vertexes, paths]
		polygon(points=mod[1], paths=mod[2]);
	} else if( mod[0] == "polyhedron-vf" ) {
		polyhedron(mod[1], faces=mod[2]);
	} else if( mod[0] == "scale" ) {
		assert(len(mod) == 3);
		scale(mod[1]) togmod1_domodule(mod[2]);
	} else if( mod[0] == "translate" ) {
		assert(len(mod) == 3);
		assert(is_list(mod[1]));
		for(c=mod[1]) assert(is_num(c), "translate component should be numeric");
		translate(mod[1]) togmod1_domodule(mod[2]);
	} else if( mod[0] == "rotate" ) {
		assert(len(mod) == 3);
		rotate(mod[1]) togmod1_domodule(mod[2]);
	} else if( mod[0] == "intersection" ) {
		intersection_for( i=[1:1:len(mod)-1] ) togmod1_domodule(mod[i]);
	} else if( mod[0] == "difference" ) {
		difference() {
			togmod1_domodule(mod[1]);
			for( i=[2:1:len(mod)-1] ) togmod1_domodule(mod[i]);
		}
	} else if( mod[0] == "union" ) {
		for( i=[1:1:len(mod)-1] ) togmod1_domodule(mod[i]);
	} else if( mod[0] == "hull" ) {
		hull() for( i=[1:1:len(mod)-1] ) togmod1_domodule(mod[i]);
	} else if( mod[0] == "offset-rs" ) {
		assert(len(mod) == 3);
		assert(is_num(mod[1]));
		assert(is_list(mod[2]));
		offset(mod[1]) togmod1_domodule(mod[2]);
	} else if( mod[0] == "linear-extrude-zs" ) {
		// ["linear-extrude-zs", [z0,z1], 2d_shape] // centered
		// ["linear-extrude-zs", height, 2d_shape]
		let( zrange = is_list(mod[1]) ? mod[1] : [-mod[1]/2, mod[1]/2] ) {
			translate([0,0,zrange[0]]) linear_extrude(zrange[1]-zrange[0]) togmod1_domodule(mod[2]);
		}
	} else if( mod[0] == "render" ) {
		render() togmod1_domodule(mod[1]);
	} else if( mod[0] == "minkowski" ) {
		minkowski() {
			togmod1_domodule(mod[1]);
			togmod1_domodule(mod[2]);
		}
	} else if( mod[0] == "x-debug" ) {
		# togmod1_domodule(mod[1]);
	} else if( mod[0] == "x-color" ) {
		color(mod[1]) togmod1_domodule(mod[2]);
	} else if( mod[0] == "text-tsfhvsdls" ) {
		text(text=mod[1], size=mod[2], font=mod[3], halign=mod[4], valign=mod[5], spacing=mod[6], direction=mod[7], language=mod[7], script=mod[8]);
	} else if( mod[0] == "offset-ds" ) {
		assert(is_num(mod[1]));
		assert(is_list(mod[2]));
		offset(delta=mod[1]) togmod1_domodule(mod[2]);
	} else {
		assert(false, str("Unrecognized shape: ", mod[0]));
	}
}
// main file
// TinyScreenPanel0.2
// 
// Main part of screen
// 27.3mm wide x 19.5mm tall should do for screen
// Maybe leave 12.7mm at top and bottom for pin heads and the cable
// Whole board is 28.5mm wide x 27.6mm tall
// Mounting hole centers are on corners of a ~24mm square
// 
// Changes:
// v0.2:
// - Make thickness configurable

glass_cutout_width_mm   = 27.3;
glass_cutout_height_mm  = 19.5;
extra_cutout_width_mm   = 12.7;
extra_cutout_height_mm  = 26.0;
module_cutout_width_mm  = 28.9;
module_cutout_height_mm = 28.0;
thickness_mm = 3.175;

$fn = 24;

module tinyscreenpanel0__end_params() { }

use <../lib/TOGMod1.scad>
use <../lib/TOGMod1Constructors.scad>
use <../lib/TOGUnits1.scad>

function reverse_list(list, mapping=function(item) item) = [for(i=[len(list)-1 : -1 : 0]) mapping(list[i])];

function mirror_points_r_to_l(points) = reverse_list(points, function(p) [-p[0],  p[1]]);
function mirror_points_t_to_b(points) = reverse_list(points, function(p) [ p[0], -p[1]]);

function extrapolate_tr(points) =
	let( top = [each points, each mirror_points_r_to_l(points)] )
	[each top, each mirror_points_t_to_b(top)];

glass_cutout_2d = togmod1_make_polygon(extrapolate_tr(
let( b = 1.5 )[
	[glass_cutout_width_mm/2, glass_cutout_height_mm/2],
	[extra_cutout_width_mm/2+b, glass_cutout_height_mm/2],
	[extra_cutout_width_mm/2, glass_cutout_height_mm/2+b],
	[extra_cutout_width_mm/2, extra_cutout_height_mm/2],
]));

block_2d = togmod1_make_rounded_rect([38.1, 38.1], r=5);
module_cutout_2d = togmod1_make_rect([module_cutout_width_mm, module_cutout_height_mm]);
tiny_screw_hole_2d = togmod1_make_circle(d=2);

togmod1_domodule(["difference",
	togmod1_linear_extrude_z([0,thickness_mm], ["difference",
		block_2d,
		glass_cutout_2d,
		for( xm=[-1,1] ) for( ym=[-1,1] ) ["translate", [xm*12,ym*12], tiny_screw_hole_2d],
	]),
	togmod1_linear_extrude_z([3.175/2,3.175*2], module_cutout_2d),
]);
